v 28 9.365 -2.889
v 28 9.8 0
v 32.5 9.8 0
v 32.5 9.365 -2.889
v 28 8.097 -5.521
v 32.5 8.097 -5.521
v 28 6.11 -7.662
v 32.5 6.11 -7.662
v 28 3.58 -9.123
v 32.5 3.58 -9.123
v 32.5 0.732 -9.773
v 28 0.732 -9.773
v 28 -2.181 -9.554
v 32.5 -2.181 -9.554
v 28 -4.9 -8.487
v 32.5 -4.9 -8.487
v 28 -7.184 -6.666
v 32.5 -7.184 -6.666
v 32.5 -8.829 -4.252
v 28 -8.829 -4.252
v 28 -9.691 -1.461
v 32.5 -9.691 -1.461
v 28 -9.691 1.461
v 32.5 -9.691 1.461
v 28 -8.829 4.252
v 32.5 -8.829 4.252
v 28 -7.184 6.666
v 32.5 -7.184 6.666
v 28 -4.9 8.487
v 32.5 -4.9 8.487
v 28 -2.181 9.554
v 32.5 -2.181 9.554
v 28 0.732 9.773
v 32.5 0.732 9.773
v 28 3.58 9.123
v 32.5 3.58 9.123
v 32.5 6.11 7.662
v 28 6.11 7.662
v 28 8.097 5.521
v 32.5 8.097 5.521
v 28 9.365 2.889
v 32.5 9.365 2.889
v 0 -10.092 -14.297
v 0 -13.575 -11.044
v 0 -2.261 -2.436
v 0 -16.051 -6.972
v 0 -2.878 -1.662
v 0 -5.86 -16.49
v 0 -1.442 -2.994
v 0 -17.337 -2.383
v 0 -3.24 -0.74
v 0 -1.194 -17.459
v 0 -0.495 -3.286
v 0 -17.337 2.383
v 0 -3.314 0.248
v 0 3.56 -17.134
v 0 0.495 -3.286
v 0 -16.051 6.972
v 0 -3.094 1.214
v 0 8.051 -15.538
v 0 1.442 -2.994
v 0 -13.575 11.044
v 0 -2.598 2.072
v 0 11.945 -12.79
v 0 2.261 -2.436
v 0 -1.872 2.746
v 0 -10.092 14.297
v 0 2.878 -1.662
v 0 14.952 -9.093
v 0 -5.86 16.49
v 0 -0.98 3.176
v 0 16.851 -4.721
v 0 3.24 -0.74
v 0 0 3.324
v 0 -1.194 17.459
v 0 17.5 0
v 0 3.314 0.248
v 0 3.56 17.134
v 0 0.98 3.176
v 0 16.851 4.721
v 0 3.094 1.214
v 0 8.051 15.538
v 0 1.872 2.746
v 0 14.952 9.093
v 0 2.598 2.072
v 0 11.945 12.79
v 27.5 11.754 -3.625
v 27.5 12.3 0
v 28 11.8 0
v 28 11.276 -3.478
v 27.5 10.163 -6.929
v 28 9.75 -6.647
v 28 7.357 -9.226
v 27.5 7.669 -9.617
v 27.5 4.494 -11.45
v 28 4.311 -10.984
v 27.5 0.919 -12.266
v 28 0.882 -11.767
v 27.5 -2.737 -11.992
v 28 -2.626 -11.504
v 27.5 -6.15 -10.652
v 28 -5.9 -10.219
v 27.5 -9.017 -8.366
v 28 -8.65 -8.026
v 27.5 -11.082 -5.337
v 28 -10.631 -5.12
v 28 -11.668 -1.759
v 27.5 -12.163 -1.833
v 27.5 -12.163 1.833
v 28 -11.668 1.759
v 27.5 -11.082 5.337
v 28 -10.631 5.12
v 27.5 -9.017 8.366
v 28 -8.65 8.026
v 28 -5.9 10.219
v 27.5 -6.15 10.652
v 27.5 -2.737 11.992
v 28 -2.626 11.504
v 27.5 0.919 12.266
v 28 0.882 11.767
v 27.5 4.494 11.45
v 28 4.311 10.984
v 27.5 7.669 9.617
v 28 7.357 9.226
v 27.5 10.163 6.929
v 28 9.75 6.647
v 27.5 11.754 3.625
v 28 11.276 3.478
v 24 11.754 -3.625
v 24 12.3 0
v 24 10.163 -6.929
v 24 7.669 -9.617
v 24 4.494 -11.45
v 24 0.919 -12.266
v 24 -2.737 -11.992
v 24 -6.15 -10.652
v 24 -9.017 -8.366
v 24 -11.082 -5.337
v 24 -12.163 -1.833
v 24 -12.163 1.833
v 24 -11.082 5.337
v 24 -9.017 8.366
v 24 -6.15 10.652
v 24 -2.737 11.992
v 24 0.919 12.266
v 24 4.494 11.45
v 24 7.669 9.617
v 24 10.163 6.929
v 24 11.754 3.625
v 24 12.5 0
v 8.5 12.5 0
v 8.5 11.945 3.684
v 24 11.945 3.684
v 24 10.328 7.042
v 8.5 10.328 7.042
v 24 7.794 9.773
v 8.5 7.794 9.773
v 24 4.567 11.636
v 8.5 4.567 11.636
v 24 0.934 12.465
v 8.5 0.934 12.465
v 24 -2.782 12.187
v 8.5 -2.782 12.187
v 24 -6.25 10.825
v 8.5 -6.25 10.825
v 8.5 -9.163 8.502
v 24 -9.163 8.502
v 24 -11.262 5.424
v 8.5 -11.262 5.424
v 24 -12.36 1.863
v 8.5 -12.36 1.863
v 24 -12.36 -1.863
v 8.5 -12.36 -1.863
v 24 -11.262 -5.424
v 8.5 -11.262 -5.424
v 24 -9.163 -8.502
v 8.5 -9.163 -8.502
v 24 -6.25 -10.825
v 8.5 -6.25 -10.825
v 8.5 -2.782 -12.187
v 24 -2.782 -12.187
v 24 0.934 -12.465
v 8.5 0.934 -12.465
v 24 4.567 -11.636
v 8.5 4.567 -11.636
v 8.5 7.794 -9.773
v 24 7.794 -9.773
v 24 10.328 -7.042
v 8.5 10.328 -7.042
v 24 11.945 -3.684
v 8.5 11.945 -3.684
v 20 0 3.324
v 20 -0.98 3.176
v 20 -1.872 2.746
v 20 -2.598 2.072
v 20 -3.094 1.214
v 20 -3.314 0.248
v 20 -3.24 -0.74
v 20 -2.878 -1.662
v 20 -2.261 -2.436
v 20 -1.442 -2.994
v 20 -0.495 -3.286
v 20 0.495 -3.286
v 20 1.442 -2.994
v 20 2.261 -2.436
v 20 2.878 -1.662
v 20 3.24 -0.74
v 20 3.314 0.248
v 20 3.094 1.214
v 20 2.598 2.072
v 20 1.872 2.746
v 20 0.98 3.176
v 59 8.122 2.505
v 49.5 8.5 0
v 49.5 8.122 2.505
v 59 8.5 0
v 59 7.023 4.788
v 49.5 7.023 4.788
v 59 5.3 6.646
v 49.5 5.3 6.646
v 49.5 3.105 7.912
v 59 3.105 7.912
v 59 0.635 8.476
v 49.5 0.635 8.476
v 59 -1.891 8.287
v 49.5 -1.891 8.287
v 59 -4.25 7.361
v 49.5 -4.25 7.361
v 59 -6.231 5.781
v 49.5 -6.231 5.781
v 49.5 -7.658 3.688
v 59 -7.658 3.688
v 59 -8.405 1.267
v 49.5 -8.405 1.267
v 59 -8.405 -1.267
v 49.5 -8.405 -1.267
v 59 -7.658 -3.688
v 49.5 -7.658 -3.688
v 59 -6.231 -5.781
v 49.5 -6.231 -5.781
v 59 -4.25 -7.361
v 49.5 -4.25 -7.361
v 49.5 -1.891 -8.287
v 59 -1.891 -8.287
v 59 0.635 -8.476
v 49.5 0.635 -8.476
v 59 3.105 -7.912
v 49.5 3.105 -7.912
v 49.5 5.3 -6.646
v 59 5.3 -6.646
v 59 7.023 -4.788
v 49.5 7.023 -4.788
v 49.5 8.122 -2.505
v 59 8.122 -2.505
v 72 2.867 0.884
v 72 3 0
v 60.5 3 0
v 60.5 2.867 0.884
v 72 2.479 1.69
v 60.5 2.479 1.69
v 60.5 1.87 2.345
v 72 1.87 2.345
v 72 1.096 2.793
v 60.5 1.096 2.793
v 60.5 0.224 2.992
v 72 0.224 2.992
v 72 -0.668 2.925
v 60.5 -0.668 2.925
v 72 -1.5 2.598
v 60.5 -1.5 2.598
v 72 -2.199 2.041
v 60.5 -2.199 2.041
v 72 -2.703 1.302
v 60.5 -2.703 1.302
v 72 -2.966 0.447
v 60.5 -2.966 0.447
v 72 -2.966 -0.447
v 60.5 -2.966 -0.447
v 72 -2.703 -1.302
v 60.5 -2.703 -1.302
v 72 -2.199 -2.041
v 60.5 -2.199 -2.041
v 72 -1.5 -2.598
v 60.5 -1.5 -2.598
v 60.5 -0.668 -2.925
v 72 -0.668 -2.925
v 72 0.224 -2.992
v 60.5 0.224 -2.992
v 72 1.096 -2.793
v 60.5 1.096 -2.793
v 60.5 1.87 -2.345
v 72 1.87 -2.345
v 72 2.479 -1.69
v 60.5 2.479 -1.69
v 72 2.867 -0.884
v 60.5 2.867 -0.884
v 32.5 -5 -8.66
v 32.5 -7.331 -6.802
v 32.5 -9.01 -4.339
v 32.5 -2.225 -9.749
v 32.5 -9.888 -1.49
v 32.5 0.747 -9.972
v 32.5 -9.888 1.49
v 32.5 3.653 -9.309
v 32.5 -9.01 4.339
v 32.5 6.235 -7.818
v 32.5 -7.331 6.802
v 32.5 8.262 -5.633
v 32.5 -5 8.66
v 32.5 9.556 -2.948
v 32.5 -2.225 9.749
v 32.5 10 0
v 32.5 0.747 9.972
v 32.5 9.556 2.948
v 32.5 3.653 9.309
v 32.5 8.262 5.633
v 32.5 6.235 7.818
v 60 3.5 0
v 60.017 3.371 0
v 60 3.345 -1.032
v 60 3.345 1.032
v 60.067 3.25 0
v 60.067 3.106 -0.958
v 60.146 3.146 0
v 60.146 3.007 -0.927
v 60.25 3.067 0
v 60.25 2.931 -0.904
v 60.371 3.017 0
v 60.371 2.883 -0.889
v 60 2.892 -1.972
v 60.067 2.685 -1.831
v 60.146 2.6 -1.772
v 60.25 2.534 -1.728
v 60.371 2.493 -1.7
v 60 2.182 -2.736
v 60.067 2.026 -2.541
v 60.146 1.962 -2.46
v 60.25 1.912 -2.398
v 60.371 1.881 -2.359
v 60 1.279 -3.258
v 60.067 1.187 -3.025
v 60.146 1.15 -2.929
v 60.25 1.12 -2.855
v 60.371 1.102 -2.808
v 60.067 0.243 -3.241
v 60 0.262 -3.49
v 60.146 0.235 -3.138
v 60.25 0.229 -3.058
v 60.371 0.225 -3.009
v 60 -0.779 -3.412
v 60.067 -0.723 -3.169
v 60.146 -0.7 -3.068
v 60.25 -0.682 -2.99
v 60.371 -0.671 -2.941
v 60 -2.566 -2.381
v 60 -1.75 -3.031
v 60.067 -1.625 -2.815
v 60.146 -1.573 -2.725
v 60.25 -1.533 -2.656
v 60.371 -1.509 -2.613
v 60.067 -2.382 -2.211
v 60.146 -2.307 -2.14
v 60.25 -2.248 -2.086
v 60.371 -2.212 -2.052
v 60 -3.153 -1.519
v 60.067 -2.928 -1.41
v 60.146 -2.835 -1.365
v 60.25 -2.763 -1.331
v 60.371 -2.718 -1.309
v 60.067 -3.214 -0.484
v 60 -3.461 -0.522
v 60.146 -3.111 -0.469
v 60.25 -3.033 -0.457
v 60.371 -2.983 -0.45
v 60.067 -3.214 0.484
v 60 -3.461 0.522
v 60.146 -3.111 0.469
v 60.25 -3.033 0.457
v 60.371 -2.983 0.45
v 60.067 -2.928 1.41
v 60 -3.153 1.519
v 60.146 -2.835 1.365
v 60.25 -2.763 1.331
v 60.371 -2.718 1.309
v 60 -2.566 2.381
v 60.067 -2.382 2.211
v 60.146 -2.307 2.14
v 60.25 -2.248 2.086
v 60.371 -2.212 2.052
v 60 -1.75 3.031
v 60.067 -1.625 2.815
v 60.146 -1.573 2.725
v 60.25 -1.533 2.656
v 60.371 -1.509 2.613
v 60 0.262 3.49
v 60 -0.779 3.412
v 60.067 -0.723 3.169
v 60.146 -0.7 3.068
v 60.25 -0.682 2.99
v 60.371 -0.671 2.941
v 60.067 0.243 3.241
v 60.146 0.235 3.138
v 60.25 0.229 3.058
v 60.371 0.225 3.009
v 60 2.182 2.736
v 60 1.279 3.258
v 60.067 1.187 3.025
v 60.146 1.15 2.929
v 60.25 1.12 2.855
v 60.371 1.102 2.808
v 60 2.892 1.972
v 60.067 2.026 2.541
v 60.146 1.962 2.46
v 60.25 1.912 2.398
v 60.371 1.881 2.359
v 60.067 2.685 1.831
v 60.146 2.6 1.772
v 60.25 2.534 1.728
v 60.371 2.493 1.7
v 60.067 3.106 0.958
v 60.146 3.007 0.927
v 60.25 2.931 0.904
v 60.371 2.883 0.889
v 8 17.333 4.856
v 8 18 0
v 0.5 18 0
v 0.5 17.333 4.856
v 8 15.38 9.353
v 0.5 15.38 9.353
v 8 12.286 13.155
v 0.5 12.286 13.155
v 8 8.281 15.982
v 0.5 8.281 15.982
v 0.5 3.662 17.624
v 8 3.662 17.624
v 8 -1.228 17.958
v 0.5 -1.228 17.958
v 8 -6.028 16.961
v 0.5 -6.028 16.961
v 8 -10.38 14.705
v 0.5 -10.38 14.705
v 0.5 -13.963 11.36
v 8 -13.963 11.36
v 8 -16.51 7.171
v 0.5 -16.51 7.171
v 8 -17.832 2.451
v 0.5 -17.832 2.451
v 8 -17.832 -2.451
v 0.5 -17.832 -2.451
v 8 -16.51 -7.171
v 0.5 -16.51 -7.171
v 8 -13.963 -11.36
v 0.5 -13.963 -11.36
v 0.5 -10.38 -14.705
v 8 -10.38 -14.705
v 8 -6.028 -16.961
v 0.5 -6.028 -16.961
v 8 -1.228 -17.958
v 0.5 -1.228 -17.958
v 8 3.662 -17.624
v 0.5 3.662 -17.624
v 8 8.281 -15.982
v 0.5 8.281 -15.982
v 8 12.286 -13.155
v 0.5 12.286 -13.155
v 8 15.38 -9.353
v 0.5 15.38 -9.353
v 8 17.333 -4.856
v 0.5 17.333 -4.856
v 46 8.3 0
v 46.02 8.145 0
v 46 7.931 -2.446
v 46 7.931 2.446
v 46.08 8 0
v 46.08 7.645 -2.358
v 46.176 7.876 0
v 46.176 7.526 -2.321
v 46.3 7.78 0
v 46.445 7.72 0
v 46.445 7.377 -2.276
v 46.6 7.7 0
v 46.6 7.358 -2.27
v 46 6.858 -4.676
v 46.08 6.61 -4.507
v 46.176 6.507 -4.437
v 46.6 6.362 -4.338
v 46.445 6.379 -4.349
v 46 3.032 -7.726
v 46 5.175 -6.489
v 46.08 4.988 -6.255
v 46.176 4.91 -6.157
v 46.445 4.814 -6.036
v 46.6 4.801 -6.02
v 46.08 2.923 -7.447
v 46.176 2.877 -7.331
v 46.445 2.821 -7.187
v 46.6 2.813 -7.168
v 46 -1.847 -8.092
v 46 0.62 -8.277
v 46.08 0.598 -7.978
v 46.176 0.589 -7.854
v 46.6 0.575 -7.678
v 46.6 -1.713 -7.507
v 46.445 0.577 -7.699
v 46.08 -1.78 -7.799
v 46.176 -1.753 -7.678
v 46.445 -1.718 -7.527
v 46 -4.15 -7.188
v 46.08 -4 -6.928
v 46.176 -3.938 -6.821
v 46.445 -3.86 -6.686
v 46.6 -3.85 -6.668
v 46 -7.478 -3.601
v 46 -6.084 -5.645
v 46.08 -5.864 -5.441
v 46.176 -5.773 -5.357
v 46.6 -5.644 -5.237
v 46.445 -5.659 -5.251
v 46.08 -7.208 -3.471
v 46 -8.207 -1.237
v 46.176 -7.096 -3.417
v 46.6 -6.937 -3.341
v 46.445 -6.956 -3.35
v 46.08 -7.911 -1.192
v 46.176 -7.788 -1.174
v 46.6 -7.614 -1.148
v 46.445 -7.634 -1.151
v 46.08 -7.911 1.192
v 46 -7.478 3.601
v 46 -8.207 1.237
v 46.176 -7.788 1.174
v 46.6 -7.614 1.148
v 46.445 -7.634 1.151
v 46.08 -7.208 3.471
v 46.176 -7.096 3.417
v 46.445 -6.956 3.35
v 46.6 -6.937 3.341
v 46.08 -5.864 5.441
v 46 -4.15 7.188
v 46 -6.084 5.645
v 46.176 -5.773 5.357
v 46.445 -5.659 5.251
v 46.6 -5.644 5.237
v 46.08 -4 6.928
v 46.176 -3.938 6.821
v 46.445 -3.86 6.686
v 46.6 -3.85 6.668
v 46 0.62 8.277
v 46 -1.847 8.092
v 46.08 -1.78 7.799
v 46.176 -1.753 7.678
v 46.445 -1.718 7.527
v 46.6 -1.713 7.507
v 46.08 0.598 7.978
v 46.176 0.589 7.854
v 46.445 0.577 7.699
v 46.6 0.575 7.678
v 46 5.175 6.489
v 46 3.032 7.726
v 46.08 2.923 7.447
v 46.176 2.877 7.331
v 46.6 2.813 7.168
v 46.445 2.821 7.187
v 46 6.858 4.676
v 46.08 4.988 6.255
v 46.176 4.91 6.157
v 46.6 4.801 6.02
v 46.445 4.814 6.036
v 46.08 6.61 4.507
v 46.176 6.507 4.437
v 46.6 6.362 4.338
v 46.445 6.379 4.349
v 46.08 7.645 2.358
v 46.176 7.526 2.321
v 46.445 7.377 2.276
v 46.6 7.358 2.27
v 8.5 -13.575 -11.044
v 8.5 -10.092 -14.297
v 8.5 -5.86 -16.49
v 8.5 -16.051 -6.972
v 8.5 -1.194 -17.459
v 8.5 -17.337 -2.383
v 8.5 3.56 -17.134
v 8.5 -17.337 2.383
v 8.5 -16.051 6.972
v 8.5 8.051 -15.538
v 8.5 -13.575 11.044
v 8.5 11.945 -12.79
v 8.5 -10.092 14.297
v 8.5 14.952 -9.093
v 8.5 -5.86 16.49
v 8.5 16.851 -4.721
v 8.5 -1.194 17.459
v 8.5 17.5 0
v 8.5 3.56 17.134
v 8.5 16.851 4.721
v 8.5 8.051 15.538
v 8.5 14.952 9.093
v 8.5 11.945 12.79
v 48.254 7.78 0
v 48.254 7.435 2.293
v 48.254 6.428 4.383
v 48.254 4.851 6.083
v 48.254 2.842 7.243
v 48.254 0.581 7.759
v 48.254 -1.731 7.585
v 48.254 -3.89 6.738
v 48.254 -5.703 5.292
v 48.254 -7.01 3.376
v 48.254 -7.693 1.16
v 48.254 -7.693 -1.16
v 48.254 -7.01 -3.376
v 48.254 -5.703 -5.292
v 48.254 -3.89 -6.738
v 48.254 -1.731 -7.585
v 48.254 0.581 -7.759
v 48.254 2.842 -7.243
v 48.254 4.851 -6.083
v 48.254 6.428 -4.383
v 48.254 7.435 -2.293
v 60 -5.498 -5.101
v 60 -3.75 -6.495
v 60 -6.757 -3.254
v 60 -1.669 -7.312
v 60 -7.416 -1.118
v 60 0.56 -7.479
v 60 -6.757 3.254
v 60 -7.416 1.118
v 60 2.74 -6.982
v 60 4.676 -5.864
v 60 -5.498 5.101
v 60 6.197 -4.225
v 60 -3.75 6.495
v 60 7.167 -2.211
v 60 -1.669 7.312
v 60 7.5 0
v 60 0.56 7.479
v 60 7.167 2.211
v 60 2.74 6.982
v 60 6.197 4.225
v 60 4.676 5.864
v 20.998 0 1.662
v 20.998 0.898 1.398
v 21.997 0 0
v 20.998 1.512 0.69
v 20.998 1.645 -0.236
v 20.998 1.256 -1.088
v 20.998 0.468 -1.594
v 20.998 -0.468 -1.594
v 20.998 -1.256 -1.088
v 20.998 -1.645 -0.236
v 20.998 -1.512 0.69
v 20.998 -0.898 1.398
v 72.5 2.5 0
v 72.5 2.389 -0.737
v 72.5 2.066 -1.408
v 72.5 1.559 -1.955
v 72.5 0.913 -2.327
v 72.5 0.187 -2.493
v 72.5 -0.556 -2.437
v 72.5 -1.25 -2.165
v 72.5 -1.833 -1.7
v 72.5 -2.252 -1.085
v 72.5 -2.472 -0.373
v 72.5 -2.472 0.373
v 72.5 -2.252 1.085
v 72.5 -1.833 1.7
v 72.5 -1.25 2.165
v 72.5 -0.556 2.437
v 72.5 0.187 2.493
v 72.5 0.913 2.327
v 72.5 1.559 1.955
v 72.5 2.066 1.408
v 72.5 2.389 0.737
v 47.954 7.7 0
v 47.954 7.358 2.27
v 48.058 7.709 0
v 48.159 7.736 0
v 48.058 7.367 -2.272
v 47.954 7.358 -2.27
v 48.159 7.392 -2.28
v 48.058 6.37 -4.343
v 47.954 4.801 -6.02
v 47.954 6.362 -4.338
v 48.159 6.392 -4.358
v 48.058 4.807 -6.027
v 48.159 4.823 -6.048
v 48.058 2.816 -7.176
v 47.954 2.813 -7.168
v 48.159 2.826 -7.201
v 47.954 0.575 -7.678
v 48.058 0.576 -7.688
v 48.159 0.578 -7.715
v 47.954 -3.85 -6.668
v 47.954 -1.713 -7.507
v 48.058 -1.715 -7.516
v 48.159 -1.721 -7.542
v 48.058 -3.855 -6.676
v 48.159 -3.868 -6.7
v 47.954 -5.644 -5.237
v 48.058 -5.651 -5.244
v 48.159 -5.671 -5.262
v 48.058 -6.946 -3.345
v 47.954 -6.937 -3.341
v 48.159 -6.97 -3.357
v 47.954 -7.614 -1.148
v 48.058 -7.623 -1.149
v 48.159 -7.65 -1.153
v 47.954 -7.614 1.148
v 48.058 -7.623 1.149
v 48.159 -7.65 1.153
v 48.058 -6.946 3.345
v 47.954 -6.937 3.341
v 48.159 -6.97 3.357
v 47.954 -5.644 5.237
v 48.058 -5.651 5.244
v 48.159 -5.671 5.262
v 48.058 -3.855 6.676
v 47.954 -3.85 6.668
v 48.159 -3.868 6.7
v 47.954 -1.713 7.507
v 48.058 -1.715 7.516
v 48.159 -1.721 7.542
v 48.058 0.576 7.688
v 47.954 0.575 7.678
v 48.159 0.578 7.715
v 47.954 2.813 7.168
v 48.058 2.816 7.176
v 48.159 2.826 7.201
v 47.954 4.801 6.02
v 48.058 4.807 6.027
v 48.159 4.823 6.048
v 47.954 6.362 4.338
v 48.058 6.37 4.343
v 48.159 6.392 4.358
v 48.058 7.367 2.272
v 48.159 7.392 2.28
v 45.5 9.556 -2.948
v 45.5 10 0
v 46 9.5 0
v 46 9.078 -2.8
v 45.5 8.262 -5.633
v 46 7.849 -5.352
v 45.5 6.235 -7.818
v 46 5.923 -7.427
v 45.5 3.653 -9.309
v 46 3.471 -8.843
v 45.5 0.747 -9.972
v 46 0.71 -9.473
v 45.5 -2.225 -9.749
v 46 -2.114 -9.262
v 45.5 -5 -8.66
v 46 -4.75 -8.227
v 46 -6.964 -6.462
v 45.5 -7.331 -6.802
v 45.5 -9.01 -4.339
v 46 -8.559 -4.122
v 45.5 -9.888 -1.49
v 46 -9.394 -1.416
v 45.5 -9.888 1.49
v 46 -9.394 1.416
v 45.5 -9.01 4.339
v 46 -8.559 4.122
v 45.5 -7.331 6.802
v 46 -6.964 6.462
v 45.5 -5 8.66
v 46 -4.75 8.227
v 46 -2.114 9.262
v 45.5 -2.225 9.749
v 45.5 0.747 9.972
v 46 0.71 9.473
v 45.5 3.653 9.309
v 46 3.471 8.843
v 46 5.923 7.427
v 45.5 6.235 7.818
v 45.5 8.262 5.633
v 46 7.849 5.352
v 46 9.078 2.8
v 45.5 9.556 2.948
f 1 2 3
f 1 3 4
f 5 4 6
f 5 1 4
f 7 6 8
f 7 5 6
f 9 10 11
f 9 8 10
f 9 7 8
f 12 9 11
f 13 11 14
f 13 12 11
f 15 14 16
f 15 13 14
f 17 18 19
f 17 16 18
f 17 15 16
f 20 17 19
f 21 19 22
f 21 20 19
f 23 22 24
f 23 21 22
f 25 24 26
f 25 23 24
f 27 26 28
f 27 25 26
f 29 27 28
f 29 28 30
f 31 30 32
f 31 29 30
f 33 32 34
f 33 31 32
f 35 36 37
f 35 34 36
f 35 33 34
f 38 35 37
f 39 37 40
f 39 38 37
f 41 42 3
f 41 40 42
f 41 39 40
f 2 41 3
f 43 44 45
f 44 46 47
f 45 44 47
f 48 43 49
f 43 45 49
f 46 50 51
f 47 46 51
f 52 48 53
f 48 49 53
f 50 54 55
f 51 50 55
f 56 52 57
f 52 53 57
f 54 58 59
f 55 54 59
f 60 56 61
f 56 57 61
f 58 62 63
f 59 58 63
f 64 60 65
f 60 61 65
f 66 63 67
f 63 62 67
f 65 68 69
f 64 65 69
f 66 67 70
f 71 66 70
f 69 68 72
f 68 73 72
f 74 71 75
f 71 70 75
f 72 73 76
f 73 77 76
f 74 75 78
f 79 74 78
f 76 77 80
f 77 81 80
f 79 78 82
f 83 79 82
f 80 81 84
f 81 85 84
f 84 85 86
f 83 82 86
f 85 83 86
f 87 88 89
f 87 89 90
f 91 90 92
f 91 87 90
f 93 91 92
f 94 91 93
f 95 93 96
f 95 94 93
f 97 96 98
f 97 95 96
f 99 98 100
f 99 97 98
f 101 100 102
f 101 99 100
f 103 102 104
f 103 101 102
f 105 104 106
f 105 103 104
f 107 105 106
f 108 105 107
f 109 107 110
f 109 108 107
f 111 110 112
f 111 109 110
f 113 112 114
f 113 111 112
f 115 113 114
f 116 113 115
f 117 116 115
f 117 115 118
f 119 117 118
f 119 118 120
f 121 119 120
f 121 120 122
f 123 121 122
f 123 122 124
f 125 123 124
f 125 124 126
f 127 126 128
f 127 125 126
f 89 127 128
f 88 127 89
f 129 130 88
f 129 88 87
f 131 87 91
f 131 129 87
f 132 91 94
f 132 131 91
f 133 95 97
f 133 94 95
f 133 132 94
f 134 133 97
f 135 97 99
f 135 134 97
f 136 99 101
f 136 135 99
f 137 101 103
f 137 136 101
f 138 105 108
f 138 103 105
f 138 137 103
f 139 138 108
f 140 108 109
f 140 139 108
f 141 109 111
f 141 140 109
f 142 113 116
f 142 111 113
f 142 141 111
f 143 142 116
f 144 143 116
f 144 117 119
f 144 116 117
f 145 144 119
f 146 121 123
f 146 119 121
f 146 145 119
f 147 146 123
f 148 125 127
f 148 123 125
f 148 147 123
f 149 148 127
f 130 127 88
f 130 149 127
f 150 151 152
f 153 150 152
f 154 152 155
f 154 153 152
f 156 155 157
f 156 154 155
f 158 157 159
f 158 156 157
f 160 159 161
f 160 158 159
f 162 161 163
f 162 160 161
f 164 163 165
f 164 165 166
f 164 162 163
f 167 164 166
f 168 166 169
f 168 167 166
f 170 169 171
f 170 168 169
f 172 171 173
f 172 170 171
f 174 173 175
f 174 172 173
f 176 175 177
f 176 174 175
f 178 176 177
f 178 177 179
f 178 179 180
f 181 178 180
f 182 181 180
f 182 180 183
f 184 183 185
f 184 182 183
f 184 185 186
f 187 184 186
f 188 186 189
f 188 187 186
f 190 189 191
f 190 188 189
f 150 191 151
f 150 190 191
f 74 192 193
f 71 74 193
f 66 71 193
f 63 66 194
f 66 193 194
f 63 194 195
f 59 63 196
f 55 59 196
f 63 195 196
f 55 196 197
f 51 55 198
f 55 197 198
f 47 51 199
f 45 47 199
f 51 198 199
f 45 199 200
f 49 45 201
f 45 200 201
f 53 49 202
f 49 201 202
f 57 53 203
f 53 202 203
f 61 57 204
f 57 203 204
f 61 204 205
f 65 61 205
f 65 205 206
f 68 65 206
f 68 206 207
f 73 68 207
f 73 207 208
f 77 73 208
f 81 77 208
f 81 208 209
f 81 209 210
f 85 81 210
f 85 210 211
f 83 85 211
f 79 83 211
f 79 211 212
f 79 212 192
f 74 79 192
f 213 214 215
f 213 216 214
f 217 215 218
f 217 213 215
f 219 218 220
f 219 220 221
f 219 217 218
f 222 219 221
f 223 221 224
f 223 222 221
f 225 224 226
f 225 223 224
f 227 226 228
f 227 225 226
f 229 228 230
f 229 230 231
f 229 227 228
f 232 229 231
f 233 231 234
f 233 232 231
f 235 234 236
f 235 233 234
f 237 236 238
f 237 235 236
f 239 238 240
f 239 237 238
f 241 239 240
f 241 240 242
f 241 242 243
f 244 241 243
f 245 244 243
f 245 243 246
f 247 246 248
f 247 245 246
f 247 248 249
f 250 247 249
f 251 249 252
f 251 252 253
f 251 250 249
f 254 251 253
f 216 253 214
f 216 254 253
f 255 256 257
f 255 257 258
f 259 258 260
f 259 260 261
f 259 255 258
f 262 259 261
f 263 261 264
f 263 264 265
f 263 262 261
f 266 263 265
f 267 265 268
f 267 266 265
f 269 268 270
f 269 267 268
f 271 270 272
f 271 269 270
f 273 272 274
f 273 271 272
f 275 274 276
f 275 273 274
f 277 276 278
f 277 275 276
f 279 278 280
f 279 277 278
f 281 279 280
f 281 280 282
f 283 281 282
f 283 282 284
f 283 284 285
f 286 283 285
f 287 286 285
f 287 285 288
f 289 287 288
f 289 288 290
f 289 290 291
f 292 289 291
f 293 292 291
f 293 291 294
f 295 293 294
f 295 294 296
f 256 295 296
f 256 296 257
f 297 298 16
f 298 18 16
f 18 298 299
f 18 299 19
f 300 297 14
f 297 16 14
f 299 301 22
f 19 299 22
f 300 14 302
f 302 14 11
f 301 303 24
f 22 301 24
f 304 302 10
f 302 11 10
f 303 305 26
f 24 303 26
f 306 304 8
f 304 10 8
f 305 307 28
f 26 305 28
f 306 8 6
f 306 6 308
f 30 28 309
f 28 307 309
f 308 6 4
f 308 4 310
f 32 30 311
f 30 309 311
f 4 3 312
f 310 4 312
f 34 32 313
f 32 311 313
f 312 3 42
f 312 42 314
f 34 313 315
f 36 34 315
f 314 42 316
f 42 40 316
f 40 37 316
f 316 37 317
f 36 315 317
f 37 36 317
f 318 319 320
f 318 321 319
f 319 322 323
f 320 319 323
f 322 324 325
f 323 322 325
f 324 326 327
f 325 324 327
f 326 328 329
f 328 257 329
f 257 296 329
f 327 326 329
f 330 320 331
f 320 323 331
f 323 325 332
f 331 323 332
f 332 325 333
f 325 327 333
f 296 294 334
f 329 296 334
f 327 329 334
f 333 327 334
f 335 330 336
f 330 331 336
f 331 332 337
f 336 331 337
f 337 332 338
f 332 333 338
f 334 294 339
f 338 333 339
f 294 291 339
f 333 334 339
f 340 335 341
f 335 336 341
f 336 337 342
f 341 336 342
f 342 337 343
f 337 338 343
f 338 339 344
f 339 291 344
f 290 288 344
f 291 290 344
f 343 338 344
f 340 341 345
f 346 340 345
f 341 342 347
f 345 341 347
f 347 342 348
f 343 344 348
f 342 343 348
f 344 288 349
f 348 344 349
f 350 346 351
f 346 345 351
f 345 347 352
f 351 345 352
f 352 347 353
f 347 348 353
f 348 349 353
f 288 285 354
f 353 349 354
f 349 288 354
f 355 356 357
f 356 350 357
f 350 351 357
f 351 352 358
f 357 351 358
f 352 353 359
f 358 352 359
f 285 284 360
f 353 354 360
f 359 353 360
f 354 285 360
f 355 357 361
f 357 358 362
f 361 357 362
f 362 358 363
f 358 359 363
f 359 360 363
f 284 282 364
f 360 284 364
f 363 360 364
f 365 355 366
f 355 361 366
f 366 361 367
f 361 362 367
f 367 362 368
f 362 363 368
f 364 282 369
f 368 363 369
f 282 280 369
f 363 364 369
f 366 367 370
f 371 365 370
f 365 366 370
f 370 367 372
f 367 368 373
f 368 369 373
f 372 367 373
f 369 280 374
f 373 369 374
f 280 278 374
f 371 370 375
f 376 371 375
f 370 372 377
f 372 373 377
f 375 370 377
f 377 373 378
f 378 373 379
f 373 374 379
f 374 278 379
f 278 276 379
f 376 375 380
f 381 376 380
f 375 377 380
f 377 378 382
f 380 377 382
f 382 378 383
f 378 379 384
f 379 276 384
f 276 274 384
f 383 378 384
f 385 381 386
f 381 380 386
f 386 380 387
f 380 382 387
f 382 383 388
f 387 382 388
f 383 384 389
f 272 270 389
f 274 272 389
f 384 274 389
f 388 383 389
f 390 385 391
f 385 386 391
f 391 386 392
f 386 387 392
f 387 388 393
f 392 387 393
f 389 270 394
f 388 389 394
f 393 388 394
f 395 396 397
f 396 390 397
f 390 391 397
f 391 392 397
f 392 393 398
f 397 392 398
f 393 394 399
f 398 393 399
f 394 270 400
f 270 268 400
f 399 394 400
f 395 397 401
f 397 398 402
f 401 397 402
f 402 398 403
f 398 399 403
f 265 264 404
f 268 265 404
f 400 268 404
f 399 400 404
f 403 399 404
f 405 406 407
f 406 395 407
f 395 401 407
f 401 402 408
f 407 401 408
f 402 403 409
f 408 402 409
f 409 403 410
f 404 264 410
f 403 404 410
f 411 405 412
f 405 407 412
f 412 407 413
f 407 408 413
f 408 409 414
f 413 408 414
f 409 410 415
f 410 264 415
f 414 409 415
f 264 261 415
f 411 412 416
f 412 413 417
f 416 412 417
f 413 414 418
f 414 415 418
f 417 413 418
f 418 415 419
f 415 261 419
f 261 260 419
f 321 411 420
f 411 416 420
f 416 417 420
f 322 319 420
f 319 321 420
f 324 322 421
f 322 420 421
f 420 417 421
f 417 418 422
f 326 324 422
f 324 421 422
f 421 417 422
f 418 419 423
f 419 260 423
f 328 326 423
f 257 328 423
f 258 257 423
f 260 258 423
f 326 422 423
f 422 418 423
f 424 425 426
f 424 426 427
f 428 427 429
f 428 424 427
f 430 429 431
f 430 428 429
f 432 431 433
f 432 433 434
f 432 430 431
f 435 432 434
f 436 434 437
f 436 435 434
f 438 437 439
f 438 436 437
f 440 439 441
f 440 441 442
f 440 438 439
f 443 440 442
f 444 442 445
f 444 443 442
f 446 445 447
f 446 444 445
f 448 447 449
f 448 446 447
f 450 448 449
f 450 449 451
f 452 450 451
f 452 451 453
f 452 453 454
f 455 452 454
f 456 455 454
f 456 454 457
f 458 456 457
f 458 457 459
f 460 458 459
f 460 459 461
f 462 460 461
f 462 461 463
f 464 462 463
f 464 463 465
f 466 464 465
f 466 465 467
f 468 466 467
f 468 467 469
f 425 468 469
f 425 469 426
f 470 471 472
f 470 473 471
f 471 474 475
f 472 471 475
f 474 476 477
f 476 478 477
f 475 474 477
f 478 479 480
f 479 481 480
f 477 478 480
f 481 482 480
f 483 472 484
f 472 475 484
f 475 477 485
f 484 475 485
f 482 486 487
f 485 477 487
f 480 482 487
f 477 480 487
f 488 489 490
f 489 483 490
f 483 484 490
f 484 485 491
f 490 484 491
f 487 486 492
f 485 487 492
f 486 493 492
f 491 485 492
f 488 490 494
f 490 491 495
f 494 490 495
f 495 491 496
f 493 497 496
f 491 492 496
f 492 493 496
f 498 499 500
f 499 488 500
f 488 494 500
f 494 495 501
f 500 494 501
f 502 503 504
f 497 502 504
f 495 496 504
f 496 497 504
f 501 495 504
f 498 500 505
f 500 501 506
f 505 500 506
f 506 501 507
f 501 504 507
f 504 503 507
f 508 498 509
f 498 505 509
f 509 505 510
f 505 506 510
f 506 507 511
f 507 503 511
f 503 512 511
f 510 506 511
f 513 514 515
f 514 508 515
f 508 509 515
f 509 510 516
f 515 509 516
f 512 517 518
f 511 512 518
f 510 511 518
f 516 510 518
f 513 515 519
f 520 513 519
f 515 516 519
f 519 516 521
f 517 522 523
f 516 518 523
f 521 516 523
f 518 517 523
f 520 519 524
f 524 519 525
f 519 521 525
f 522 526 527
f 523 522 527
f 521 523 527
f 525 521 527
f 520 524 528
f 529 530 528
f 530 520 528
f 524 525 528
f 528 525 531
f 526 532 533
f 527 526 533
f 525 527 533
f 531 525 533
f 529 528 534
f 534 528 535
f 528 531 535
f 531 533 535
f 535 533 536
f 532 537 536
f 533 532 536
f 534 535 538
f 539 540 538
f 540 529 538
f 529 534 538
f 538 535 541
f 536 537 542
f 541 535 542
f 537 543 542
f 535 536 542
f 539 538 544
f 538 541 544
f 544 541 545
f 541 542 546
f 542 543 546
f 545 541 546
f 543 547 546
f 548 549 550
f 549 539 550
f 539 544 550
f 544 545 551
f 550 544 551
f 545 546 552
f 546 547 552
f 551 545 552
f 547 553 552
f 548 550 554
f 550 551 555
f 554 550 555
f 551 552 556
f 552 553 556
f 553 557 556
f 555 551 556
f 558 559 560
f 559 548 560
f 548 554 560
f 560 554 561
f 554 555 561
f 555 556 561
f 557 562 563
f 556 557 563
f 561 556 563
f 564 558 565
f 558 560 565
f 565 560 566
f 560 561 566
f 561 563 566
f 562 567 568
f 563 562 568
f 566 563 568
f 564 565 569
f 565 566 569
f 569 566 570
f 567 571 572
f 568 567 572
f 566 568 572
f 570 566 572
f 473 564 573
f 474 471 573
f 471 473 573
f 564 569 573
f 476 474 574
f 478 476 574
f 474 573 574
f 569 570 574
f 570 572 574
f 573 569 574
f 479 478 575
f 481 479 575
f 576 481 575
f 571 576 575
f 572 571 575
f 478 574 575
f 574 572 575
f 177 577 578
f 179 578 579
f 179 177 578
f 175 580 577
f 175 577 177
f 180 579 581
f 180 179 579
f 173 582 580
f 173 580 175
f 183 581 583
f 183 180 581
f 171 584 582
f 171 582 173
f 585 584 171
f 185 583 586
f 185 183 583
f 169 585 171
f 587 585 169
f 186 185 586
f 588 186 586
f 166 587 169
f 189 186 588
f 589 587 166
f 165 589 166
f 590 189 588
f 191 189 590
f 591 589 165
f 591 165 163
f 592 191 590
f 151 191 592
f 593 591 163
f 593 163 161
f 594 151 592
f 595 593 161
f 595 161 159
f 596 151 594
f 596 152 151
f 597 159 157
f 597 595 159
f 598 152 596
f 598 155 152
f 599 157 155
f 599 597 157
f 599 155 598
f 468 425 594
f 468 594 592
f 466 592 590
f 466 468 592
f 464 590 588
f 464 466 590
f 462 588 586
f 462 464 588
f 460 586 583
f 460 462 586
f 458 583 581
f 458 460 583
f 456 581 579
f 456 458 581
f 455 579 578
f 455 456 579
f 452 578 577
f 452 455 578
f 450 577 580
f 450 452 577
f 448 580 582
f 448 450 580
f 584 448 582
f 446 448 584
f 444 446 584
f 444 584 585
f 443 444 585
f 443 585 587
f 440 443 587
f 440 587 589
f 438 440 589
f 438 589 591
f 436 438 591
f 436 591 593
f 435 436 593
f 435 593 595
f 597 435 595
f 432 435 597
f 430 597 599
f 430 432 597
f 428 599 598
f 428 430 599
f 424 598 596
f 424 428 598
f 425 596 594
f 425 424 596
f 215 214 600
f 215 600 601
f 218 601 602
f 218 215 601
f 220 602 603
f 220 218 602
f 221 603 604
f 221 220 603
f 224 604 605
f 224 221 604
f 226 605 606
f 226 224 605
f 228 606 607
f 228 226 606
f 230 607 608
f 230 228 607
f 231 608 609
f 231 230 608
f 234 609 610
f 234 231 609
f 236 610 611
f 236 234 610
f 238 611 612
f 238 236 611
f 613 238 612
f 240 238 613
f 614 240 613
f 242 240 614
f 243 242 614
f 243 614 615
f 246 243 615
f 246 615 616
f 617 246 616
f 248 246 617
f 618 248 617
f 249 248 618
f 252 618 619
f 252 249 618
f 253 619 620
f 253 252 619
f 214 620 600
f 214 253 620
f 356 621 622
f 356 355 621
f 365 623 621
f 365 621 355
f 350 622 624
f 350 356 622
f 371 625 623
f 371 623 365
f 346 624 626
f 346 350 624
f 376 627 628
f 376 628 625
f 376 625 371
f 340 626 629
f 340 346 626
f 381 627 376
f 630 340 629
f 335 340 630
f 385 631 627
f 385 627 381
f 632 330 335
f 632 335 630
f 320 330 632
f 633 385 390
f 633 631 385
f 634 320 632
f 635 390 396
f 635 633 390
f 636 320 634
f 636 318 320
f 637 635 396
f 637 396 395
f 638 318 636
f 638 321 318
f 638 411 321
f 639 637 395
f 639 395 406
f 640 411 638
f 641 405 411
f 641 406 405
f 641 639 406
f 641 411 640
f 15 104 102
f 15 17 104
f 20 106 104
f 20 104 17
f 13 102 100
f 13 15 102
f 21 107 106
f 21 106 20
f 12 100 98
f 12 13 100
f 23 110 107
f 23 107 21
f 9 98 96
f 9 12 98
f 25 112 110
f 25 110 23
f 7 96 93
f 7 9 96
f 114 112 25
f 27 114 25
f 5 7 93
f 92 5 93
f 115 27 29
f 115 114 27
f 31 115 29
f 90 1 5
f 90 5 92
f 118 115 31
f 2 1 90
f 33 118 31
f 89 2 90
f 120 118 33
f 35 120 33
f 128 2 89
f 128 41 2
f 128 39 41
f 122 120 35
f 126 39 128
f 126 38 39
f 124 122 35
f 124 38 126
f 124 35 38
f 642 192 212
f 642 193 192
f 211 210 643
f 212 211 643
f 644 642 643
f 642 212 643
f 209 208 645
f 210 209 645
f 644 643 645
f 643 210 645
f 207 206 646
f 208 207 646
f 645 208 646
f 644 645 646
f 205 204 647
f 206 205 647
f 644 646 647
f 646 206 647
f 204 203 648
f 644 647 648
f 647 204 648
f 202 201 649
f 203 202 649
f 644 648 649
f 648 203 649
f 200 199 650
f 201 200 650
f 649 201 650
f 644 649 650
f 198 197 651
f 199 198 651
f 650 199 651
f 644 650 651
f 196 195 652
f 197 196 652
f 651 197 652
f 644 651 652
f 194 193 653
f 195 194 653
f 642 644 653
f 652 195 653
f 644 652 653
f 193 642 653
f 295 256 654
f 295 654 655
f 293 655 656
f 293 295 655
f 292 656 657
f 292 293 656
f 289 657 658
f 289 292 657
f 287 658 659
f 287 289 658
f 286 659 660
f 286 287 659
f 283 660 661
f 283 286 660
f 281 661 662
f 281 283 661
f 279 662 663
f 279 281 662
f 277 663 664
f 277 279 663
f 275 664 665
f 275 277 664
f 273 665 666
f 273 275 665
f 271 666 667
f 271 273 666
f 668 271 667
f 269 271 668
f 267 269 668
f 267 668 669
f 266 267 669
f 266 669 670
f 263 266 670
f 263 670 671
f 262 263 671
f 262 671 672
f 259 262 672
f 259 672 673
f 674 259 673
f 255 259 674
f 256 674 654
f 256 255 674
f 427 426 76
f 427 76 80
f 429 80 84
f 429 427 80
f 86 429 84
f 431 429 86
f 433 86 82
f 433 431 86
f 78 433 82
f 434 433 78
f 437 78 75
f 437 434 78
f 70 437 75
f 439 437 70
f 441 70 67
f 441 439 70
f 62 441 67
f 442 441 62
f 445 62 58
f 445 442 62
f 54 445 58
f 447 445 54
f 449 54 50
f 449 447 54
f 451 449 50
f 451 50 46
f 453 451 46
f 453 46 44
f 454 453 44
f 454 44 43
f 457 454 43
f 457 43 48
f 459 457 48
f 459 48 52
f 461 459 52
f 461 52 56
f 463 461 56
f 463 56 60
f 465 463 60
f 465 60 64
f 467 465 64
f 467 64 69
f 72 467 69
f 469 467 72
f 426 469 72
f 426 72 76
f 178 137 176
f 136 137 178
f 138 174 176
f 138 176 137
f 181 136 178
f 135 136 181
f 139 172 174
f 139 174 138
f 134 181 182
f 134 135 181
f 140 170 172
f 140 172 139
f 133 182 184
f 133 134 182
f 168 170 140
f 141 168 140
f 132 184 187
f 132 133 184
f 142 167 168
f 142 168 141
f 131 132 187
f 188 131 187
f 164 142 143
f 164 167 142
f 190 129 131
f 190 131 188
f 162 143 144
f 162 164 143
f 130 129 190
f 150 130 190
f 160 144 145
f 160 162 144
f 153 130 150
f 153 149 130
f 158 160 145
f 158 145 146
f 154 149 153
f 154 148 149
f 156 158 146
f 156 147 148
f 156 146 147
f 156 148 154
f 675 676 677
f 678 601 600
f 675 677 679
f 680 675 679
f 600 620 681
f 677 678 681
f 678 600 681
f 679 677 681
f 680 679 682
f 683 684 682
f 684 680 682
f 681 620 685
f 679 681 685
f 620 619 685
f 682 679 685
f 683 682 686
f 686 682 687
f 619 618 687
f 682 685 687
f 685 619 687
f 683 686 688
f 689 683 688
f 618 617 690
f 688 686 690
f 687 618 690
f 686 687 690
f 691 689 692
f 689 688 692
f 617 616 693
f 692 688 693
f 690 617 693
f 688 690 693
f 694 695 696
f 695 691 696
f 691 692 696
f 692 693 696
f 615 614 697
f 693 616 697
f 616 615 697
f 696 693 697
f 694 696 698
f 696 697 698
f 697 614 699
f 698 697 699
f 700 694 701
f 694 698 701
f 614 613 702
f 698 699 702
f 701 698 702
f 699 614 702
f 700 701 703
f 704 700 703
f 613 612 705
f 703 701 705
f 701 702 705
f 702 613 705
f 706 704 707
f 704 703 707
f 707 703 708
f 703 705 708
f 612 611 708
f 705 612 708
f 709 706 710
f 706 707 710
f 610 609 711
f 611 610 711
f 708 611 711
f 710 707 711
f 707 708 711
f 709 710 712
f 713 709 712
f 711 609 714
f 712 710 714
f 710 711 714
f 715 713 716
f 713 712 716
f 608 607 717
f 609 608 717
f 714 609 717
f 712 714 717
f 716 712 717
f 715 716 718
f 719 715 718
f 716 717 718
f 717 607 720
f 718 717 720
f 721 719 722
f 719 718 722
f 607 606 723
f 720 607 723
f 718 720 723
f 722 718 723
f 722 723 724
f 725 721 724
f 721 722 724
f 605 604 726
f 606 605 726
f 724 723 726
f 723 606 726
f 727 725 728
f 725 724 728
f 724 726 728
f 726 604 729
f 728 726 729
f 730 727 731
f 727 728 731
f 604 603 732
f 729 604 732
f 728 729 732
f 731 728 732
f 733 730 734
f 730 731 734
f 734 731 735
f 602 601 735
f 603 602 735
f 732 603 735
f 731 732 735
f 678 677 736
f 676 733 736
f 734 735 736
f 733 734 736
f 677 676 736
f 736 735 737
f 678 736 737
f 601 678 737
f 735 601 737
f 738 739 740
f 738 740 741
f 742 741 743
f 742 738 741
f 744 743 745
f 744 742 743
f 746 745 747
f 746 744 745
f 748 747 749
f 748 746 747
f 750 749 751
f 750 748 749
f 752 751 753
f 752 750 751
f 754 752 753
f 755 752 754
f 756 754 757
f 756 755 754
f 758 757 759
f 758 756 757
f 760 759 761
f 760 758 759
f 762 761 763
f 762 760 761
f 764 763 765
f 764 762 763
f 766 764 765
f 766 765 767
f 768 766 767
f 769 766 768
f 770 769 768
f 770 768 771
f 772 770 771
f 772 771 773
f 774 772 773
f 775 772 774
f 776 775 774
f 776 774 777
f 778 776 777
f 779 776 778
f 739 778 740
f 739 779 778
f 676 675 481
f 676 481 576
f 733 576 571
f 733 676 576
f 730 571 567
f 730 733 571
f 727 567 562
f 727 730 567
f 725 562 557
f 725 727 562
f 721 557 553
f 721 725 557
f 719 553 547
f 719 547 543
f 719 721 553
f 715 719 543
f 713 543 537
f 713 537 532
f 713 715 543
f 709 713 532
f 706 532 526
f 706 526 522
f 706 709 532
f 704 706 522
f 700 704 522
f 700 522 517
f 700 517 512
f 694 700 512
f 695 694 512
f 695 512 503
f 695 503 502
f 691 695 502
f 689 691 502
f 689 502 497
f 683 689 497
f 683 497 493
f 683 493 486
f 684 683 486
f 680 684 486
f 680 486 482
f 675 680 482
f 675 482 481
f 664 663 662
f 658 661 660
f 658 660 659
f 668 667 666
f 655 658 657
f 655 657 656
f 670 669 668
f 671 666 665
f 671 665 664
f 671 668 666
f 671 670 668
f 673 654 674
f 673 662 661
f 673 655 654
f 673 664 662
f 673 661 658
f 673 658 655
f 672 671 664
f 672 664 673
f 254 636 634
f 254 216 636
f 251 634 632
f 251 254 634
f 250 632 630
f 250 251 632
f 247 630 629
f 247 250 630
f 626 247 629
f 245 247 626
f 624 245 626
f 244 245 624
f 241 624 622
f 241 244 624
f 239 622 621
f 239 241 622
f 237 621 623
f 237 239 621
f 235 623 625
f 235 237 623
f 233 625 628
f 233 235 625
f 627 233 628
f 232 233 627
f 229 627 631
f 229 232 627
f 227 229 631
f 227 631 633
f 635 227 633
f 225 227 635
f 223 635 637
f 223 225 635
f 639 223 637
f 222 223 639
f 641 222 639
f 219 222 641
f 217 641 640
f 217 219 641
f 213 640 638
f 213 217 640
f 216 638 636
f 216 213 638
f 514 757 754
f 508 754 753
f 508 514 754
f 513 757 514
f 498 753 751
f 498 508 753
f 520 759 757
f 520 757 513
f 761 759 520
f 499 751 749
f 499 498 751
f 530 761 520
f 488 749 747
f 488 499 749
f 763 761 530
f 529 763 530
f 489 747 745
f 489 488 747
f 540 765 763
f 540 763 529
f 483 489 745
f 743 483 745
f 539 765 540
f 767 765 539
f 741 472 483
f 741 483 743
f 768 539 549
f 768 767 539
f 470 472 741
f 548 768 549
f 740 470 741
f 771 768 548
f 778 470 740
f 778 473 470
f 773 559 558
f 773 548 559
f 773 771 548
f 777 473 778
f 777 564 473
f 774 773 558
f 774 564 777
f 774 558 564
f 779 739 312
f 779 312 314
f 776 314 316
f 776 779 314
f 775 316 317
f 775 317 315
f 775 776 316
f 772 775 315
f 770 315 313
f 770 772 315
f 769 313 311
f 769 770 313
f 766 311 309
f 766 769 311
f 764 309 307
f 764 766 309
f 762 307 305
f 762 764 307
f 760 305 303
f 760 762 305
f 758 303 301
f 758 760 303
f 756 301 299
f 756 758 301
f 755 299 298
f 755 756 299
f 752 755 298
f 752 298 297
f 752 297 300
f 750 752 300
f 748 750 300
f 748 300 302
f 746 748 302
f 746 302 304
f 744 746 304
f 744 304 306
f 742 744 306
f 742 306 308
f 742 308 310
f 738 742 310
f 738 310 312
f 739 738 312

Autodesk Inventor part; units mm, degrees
ref_plane "YZ Plane" through (0, 0, 0) normal (1, 0, 0) x (0, 1, 0)
ref_plane "XZ Plane" through (0, 0, 0) normal (0, 1, 0) x (-1, 0, 0)
ref_plane "XY Plane" through (0, 0, 0) normal (0, 0, 1) x (1, 0, 0)
sketch "Skizze1" plane through (0, 0, 0) normal (0, 0, 1) x (1, 0, 0)
  line L0 (0, 0) -> (0, 18)
  line L1 (8.5, 12.5) -> (24, 12.5)
  line L2 (46, 10) -> (46, 8.3)
  arc A0 (46, 8.3) -> (46.6, 7.7) centre (46.6, 8.3) ccw
  line L3 (46.6, 7.7) -> (47.9536, 7.7)
  arc A1 (47.9536, 7.7) -> (48.2536, 7.7804) centre (47.9536, 8.3) ccw
  line L4 (48.2536, 7.7804) -> (49.5, 8.5)
  line L5 (72.5, 3) -> (72.5, 0)
  line L6 (0, 0) -> (72.5, 0)
  line L7 (-14.5, 0) -> (87, 0) construction
  line L8 (32.5, 10) -> (46, 10)
  line L9 (60, 7.5) -> (60, 3)
  line L10 (60, 3) -> (72.5, 3)
  line L11 (49.5, 8.5) -> (59, 8.5)
  line L12 (60, 7.5) -> (59, 8.5)
  line L13 (64, -11.5) -> (64, 11.5) construction
  line L14 (0, 18) -> (8.5, 18)
  line L15 (8.5, 18) -> (8.5, 12.5)
  line L16 (24, 12.5) -> (24, 12.3)
  line L17 (32.5, 10) -> (32.5, 9.8)
  line L18 (32.5, 9.8) -> (28, 9.8)
  line L19 (28, 9.8) -> (28, 12.3)
  line L20 (28, 12.3) -> (24, 12.3)
  point P0 (60, 8.5)
  dimension "d0" = 25
  dimension "d3" = 0.6
  dimension "d4" = 0.6
  dimension "d7" = 3.5
  dimension "d35" = 15.4
  dimension "d36" = 24
  dimension "d37" = 32.5
  dimension "d38" = 20
  dimension "d39" = 46
  dimension "d40" = 17
  dimension "d41" = 30
  dimension "d42" = 1
  dimension "d43" = 1
  dimension "d44" = 60
  dimension "d45" = 6
  dimension "d56" = 8.5
  dimension "d57" = 36
  dimension "d58" = 8.5
  dimension "d60" = 0.2
  dimension "d61" = 0.2
  dimension "d62" = 4
revolve "Grundprofil" add sketch "Skizze1" angle 360 about axis through (-10, 0, 0) along (1, 0, 0)
sketch "Skizze2" plane through (0, 0, 0) normal (-1, 0, 0) x (0, 0, 1)
  point P0 (0, 0)
  point P1 (0, 0)
hole "M8 Sacklochbohrung" at (0, 0, 0) direction (1, 0, 0) diameter 6.647 depth 20 tip angle 118 thread size "M8x1.25" class "6H" standard "ISO Metric profile"
thread "M17x1mm Aussenfeingewinde" size "M17x1" class "6g" standard "ISO Metric profile" full length
fillet "Kerbwirkungsreduktion 0.5mm" radius 0.5 1 edges at (60, -3, 0)
chamfer "Fase4" distance 0.5 angle 45 5 edges at (0, -18, 0) (8.5, -18, 0) (28, -12.3, 0) (46, -10, 0) (72.5, -3, 0)
equation "\"d43\" = d42"
properties part number "Shoulder_Shaft_Pitch" material "Stahl, hochfest, niedrig legiert"
